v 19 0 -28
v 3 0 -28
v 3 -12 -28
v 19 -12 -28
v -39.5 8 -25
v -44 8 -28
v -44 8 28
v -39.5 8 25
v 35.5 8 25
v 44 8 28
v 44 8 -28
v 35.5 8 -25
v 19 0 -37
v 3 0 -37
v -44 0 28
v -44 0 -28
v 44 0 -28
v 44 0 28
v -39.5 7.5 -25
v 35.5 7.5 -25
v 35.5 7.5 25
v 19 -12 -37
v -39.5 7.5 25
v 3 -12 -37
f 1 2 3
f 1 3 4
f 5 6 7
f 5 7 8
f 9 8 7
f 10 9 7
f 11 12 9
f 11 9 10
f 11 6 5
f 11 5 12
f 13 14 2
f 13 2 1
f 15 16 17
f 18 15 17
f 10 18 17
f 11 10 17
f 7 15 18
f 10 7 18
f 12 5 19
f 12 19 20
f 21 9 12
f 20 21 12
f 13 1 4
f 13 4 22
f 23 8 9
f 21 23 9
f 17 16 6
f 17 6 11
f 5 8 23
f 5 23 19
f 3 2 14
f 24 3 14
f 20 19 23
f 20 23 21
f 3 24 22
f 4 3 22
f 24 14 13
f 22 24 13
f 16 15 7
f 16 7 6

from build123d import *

# Parameters (mm, degrees)
SKETCH1_W           = 88
SKETCH1_H           = 56
BOSS_EXTRUDE1_DEPTH = 8
SKETCH2_W           = 75
SKETCH2_H           = 50
CUT_EXTRUDE1_DEPTH  = 0.5
SKETCH3_W           = 16
SKETCH3_H           = 9
BOSS_EXTRUDE2_DEPTH = 12


with BuildPart() as part:
    # Sketch1 → Boss-Extrude1 (new body)
    with BuildSketch(Plane(origin=(0, 0, 0), x_dir=(1, 0, 0), z_dir=(0, 1, 0))):
        Rectangle(SKETCH1_W, SKETCH1_H)
    extrude(amount=BOSS_EXTRUDE1_DEPTH)

    # Sketch2 → Cut-Extrude1 (cut)
    with BuildSketch(Plane(origin=(0, 8, 0), x_dir=(1, 0, 0), z_dir=(0, 1, 0))):
        with Locations((-2, 0)):
            Rectangle(SKETCH2_W, SKETCH2_H)
    extrude(amount=-CUT_EXTRUDE1_DEPTH, mode=Mode.SUBTRACT)


with BuildPart() as body_2:
    # Sketch3 → Boss-Extrude2 (new body)
    with BuildSketch(Plane(origin=(0, 0, 0), x_dir=(1, 0, 0), z_dir=(0, 1, 0))):
        with Locations((11, 32.5)):
            Rectangle(SKETCH3_W, SKETCH3_H)
    extrude(amount=-BOSS_EXTRUDE2_DEPTH)


solid = Compound([part.part, body_2.part])
